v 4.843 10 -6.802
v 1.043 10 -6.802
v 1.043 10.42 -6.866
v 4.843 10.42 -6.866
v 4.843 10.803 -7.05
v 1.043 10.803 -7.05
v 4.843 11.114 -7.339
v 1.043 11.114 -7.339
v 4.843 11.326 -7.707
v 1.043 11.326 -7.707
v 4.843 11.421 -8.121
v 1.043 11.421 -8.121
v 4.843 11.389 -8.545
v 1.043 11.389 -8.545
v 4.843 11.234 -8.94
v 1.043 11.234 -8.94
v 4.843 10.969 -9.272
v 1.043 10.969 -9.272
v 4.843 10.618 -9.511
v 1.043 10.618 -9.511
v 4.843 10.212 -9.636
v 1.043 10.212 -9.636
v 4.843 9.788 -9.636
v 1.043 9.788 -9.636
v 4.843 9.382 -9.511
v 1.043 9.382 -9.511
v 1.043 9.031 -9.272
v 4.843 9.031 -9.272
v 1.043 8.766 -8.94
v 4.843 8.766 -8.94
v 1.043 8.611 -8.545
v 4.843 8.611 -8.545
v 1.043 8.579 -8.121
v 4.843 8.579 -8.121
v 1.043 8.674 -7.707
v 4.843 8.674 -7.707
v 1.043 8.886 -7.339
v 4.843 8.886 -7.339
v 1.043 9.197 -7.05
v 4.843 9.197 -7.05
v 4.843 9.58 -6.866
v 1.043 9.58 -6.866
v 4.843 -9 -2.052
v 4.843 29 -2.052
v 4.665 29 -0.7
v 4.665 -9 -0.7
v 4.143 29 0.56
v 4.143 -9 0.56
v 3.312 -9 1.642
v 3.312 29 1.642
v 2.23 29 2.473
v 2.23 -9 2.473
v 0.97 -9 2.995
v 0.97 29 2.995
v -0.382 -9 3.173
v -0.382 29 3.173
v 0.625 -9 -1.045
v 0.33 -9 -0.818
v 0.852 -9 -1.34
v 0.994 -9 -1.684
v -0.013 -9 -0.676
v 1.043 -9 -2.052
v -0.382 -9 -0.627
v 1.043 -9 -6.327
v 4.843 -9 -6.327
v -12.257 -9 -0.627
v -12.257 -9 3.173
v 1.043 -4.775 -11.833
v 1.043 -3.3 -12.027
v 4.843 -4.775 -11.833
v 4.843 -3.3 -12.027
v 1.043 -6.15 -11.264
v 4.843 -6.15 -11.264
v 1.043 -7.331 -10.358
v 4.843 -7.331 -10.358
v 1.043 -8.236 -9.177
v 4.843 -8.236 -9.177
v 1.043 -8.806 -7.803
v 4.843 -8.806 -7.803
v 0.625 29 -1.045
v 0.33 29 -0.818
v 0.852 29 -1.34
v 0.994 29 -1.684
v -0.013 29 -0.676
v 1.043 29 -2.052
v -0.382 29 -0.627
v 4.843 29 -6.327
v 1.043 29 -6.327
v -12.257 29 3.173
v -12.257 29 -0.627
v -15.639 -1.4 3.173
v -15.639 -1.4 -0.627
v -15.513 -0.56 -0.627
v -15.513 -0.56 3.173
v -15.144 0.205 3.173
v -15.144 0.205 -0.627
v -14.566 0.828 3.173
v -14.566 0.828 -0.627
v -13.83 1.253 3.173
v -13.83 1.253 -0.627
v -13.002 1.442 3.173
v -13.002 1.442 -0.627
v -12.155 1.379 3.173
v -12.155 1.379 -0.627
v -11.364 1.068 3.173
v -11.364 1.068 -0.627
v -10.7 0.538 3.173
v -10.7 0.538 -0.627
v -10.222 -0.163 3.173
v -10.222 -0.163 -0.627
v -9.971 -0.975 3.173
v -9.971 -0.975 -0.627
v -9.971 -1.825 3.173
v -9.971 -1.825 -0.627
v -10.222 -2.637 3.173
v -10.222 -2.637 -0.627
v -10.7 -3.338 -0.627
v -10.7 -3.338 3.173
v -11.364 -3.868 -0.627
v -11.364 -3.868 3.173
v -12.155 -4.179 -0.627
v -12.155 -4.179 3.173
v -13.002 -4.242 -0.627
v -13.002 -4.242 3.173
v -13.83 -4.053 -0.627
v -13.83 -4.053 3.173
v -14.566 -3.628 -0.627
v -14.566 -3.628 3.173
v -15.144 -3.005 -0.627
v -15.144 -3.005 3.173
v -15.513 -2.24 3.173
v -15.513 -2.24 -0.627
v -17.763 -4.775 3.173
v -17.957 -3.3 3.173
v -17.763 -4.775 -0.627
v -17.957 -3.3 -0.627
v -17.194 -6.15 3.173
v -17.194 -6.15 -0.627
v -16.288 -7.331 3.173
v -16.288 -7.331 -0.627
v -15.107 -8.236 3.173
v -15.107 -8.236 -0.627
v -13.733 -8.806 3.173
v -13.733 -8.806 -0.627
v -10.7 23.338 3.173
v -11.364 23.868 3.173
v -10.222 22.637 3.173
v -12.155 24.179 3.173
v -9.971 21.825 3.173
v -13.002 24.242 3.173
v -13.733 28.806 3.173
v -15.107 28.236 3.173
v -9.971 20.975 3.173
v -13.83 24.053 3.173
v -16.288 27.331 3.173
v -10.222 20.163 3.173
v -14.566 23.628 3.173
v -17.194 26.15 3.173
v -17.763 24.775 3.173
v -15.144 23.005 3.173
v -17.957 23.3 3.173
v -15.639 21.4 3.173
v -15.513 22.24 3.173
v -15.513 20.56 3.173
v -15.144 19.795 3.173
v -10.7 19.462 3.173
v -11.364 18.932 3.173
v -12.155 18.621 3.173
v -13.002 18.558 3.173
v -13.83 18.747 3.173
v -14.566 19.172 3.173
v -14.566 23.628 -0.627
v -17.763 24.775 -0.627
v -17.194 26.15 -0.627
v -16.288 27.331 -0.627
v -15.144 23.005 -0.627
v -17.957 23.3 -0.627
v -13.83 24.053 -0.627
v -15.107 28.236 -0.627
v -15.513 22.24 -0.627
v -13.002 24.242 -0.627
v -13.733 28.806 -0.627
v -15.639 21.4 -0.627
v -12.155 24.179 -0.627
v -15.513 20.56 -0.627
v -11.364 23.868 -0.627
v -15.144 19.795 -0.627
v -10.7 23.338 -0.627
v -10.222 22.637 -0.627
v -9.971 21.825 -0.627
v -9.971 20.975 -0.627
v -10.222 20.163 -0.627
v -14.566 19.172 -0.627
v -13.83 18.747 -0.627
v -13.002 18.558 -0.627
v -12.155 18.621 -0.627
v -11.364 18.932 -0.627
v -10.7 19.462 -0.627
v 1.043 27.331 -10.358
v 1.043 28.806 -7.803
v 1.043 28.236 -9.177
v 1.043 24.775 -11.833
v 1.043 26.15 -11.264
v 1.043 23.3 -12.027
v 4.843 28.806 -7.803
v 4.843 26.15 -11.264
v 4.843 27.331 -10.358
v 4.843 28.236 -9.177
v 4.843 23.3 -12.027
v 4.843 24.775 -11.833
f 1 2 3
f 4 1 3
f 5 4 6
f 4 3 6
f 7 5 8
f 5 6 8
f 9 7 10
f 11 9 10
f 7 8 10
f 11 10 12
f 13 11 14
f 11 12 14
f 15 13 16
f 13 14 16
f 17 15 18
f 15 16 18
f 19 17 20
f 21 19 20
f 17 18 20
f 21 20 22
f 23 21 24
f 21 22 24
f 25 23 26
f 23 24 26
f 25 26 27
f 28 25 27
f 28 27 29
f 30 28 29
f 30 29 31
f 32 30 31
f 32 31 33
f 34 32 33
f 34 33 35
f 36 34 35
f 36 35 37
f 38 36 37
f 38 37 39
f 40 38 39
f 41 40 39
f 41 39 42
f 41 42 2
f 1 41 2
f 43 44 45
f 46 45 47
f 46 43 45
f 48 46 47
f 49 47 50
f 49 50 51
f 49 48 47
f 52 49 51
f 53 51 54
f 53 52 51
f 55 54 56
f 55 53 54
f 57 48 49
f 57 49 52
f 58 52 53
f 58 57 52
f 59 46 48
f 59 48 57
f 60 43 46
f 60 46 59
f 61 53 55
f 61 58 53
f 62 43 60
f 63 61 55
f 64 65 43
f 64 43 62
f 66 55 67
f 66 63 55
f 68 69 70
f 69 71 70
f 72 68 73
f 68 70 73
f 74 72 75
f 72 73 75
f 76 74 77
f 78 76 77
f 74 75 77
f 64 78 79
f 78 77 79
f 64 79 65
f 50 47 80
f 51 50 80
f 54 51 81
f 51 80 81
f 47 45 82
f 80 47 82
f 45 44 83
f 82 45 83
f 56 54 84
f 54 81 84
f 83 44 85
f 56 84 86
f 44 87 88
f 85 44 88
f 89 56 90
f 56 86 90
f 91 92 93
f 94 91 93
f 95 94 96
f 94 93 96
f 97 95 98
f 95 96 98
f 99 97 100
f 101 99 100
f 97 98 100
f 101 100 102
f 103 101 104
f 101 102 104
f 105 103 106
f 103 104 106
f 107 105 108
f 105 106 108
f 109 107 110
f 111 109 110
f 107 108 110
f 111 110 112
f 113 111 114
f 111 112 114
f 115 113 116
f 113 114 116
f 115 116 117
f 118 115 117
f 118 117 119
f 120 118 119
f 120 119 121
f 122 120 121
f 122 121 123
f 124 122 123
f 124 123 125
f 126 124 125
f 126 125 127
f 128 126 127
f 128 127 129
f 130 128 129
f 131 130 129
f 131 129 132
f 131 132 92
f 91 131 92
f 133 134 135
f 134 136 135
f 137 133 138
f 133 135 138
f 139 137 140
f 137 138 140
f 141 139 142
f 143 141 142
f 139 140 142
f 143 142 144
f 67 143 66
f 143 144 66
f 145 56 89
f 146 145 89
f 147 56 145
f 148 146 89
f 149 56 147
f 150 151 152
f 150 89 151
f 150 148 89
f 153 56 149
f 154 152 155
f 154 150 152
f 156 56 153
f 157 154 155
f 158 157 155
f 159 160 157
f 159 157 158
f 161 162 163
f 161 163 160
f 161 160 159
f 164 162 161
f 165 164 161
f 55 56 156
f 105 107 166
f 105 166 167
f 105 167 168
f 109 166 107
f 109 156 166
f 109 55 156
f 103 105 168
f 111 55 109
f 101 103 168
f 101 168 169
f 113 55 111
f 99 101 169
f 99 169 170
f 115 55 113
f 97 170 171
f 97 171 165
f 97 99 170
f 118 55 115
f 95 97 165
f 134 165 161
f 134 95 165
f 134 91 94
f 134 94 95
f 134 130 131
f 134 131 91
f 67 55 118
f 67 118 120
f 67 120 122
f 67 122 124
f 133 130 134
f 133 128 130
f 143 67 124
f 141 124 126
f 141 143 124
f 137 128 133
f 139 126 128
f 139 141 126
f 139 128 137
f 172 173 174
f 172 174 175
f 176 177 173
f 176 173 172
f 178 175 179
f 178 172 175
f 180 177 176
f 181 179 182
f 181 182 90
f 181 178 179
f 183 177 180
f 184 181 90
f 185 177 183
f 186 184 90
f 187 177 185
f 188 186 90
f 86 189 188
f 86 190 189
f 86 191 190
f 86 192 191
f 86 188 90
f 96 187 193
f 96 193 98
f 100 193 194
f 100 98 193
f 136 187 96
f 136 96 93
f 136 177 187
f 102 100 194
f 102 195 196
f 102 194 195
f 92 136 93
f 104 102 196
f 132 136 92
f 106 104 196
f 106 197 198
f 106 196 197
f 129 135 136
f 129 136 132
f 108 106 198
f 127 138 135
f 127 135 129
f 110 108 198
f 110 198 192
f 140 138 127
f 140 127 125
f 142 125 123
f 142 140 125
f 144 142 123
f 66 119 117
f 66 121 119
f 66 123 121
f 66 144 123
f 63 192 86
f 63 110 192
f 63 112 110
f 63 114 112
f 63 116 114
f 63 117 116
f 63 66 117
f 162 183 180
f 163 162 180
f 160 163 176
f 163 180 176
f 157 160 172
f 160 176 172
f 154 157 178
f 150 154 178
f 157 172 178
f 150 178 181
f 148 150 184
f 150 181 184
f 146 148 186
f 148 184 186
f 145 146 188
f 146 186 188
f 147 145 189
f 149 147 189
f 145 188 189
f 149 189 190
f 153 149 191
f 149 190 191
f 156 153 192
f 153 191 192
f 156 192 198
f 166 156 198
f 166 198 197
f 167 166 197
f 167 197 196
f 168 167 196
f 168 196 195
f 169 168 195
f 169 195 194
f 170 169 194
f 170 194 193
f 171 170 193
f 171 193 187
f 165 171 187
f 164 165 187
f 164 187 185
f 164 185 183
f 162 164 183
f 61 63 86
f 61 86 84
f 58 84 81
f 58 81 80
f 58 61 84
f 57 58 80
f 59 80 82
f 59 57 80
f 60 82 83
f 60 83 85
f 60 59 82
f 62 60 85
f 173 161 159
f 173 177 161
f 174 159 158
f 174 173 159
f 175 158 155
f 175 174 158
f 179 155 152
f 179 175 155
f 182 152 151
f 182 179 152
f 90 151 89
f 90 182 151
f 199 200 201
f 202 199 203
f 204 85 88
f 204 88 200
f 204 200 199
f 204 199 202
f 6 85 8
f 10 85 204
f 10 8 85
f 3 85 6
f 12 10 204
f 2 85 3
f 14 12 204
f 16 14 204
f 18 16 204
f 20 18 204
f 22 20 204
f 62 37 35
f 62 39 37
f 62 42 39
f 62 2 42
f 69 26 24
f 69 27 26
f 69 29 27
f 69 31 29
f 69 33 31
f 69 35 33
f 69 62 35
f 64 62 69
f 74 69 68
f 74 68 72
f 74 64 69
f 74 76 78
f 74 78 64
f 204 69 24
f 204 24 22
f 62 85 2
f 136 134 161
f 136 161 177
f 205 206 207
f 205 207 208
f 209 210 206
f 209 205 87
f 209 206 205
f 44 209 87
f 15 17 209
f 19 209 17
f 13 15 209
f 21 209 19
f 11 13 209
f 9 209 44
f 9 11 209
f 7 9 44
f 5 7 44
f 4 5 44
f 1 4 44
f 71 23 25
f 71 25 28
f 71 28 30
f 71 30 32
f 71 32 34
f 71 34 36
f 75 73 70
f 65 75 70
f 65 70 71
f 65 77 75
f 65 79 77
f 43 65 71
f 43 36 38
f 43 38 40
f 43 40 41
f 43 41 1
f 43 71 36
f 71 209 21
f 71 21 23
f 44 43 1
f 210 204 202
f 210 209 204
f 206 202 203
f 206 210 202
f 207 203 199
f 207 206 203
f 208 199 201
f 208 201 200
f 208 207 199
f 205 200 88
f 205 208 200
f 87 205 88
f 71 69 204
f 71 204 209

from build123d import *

# Parameters (mm, degrees)
BOSS_EXTRUDE1_DEPTH = 20
FILLET1_R           = 3
SKETCH3_R           = 1.5
CUT_EXTRUDE1_DEPTH  = 24.600847442
SKETCH4_R           = 0.75
CUT_EXTRUDE2_DEPTH  = 24.430749028
SCALE1_SCALE        = 1.9


with BuildPart() as part:
    # Sketch2 → Boss-Extrude1 (new body)
    with BuildSketch(Plane(origin=(0, 0, 0), x_dir=(1, 0, 0), z_dir=(0, 1, 0))):
        with BuildLine():
            Line((-1, 7), (1, 7))
            Line((1, 7), (1, 1.75))
            ThreePointArc((1, 1.75), (0.194543648, -0.194543648), (-1.75, -1))
            Line((-1.75, -1), (-11, -1))
            Line((-11, -1), (-11, 1))
            Line((-11, 1), (-1.75, 1))
            ThreePointArc((-1.75, 1), (-1.219669914, 1.219669914), (-1, 1.75))
            Line((-1, 1.75), (-1, 7))
        make_face()
    extrude(amount=BOSS_EXTRUDE1_DEPTH)

    # Fillet1
    fillet1_edges = [part.edges().sort_by_distance(p)[0] for p in [
        (-11, 0, 0),
        (-11, 20, 0),
        (0, 20, -7),
        (0, 0, -7),
    ]]
    fillet(fillet1_edges, radius=FILLET1_R)

    # Sketch3 → Cut-Extrude1 (cut, through all)
    with BuildSketch(Plane(origin=(0, 0, -1), x_dir=(-1, 0, 0), z_dir=(0, 0, -1))):
        with Locations((8.28, 16)):
            Circle(SKETCH3_R)
        with Locations((8.28, 4)):
            Circle(SKETCH3_R)
    extrude(amount=-CUT_EXTRUDE1_DEPTH, mode=Mode.SUBTRACT)

    # Sketch4 → Cut-Extrude2 (cut, through all)
    with BuildSketch(Plane.ZY.offset(1)):
        with Locations((-5, 10)):
            Circle(SKETCH4_R)
    extrude(amount=-CUT_EXTRUDE2_DEPTH, mode=Mode.SUBTRACT)


with BuildPart() as part_1:
    # Scale1: scaled about (-3.269699992, 10, -1.413989503)
    add(part.part.scale(SCALE1_SCALE).moved(Location((2.942729993, -9, 1.272590553))))


solid = part_1.part
